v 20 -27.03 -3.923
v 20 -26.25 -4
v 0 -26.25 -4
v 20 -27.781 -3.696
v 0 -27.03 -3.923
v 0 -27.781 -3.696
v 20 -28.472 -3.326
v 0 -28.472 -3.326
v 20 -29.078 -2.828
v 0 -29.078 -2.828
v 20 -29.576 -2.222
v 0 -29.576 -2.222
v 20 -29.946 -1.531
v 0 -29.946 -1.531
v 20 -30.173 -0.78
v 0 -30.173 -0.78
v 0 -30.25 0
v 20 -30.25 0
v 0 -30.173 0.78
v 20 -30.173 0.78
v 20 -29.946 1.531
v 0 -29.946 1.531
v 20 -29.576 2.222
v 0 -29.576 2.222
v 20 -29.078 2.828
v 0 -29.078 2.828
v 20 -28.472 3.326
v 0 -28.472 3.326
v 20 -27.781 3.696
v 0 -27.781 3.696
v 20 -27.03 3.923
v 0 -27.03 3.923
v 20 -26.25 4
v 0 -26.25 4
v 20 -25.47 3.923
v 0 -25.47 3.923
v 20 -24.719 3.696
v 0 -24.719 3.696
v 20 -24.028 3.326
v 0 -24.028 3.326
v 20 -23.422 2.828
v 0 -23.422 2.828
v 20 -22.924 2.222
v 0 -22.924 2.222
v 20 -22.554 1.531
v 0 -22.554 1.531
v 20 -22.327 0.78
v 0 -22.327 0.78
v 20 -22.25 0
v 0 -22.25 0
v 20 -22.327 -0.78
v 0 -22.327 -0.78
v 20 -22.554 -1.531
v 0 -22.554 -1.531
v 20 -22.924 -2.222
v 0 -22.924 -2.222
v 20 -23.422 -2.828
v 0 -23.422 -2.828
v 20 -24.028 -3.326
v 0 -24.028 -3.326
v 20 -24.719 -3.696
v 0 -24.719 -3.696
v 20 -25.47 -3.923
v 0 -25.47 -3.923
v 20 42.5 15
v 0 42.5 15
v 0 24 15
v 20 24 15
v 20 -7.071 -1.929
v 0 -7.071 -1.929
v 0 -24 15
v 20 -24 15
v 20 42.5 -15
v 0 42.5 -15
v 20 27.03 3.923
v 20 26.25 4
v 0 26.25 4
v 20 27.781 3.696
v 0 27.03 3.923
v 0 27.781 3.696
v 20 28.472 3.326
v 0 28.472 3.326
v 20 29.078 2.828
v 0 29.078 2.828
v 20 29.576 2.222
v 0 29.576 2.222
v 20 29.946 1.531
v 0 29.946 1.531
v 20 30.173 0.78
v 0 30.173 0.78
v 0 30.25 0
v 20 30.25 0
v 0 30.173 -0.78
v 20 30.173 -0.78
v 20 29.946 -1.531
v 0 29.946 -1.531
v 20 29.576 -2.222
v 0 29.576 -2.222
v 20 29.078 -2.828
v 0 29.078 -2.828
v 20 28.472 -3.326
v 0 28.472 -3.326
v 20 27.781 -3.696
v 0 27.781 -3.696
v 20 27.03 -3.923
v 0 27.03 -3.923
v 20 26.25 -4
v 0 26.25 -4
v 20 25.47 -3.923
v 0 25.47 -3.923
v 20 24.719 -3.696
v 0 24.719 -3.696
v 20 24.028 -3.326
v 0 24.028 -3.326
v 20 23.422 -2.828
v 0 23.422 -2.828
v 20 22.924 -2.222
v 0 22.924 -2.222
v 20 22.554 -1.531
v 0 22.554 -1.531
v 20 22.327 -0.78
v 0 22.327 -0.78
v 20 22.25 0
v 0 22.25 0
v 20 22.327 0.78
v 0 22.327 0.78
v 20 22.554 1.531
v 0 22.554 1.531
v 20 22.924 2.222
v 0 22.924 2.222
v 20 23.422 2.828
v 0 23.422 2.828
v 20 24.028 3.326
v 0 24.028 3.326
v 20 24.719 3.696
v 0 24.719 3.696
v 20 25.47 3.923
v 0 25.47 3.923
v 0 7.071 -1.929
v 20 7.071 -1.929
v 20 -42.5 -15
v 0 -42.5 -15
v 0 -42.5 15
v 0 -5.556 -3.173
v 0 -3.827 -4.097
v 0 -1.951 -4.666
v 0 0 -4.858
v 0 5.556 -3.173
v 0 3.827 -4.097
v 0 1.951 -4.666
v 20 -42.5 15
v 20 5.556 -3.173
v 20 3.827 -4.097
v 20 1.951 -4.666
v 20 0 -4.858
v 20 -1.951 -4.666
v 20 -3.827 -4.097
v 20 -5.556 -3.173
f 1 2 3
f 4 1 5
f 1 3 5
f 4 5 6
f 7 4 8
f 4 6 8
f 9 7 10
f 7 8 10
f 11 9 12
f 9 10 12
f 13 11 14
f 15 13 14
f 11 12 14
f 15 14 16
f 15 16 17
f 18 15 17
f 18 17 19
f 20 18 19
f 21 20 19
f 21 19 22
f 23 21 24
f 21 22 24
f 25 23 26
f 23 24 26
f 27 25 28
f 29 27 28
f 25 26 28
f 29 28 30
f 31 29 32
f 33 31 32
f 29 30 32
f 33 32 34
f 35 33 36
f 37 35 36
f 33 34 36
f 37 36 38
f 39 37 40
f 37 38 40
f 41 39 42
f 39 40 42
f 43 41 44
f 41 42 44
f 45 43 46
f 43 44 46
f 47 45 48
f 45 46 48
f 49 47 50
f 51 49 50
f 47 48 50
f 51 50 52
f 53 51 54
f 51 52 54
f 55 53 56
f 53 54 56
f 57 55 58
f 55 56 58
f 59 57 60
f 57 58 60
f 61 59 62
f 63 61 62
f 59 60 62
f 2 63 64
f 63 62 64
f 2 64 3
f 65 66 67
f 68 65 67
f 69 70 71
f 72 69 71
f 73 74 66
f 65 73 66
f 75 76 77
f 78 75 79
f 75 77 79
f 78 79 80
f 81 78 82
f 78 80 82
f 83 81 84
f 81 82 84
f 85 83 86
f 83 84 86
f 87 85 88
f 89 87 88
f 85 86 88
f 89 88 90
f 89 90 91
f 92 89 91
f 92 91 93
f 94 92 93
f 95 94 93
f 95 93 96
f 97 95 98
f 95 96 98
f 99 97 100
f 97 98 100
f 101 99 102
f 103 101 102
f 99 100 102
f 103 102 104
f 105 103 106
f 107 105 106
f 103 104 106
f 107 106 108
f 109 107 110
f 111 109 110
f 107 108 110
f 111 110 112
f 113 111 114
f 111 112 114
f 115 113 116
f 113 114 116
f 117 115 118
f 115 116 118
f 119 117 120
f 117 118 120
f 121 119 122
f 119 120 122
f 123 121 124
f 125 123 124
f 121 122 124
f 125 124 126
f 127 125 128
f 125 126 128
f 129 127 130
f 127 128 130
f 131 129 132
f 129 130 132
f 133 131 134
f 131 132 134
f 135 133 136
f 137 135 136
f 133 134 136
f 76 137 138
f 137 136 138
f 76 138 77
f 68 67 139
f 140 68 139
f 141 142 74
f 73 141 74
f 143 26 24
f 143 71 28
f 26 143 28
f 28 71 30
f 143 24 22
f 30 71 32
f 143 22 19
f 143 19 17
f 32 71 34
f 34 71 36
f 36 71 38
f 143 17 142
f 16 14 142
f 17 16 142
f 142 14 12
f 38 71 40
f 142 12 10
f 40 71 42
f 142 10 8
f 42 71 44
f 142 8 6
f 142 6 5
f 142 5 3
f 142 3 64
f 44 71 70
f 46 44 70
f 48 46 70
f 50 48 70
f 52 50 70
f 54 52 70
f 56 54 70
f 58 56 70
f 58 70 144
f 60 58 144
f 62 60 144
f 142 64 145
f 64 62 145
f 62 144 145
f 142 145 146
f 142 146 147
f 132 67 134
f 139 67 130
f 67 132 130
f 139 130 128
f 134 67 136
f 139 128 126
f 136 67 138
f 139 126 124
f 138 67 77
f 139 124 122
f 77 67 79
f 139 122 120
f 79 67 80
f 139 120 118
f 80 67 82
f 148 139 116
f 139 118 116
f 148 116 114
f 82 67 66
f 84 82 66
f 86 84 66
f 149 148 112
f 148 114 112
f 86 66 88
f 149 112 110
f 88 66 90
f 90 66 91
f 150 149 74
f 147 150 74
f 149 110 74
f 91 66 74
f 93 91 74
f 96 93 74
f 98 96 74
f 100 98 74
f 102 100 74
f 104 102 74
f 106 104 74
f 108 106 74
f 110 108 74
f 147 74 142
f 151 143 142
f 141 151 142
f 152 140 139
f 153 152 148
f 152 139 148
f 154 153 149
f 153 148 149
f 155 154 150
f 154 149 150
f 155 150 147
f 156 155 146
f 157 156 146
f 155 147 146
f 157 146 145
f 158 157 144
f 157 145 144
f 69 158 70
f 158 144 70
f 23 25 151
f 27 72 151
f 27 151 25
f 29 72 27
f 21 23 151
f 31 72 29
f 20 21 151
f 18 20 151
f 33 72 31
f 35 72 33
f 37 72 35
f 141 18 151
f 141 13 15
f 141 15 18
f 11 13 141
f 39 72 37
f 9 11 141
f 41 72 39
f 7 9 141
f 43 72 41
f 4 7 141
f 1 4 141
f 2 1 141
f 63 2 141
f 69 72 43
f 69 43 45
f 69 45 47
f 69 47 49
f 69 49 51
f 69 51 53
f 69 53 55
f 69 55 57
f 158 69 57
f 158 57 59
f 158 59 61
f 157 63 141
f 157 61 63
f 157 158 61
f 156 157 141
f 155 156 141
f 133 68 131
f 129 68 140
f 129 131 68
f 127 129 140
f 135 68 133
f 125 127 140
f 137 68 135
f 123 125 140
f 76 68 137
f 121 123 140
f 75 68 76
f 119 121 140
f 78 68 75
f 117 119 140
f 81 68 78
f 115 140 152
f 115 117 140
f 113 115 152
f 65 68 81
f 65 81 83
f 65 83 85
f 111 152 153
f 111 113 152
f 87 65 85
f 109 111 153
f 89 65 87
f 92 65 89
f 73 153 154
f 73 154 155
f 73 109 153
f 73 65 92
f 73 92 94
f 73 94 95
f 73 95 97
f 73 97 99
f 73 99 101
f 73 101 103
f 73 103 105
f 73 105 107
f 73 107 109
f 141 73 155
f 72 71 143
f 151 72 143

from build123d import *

# Parameters (mm, degrees)
EXTRUDE_1_DEPTH     = 20
SKETCH_3_R          = 4
CUT_EXTRUDE_1_DEPTH = 20


with BuildPart() as part:
    # 草图1 → 凸台-拉伸1 (new body)
    with BuildSketch(Plane(origin=(0, 0, 0), x_dir=(0, 0, -1), z_dir=(1, 0, 0))):
        with BuildLine():
            Line((-15, 24), (1.928932188, 7.071067812))
            ThreePointArc((1.928932188, 7.071067812), (4.857864376, 0), (1.928932188, -7.071067812))
            Line((1.928932188, -7.071067812), (-15, -24))
            Line((-15, -24), (-15, -42.5))
            Line((-15, -42.5), (15, -42.5))
            Line((15, -42.5), (15, 42.5))
            Line((15, 42.5), (-15, 42.5))
            Line((-15, 42.5), (-15, 24))
        make_face()
    extrude(amount=EXTRUDE_1_DEPTH)

    # 草图3 → 切除-拉伸1 (cut)
    with BuildSketch(Plane.ZY):
        with Locations((0, 26.25)):
            Circle(SKETCH_3_R)
        with Locations(Location((0, -26.25, 0), (0, 0, 180))):
            Circle(SKETCH_3_R)
    extrude(amount=-CUT_EXTRUDE_1_DEPTH, mode=Mode.SUBTRACT)


solid = part.part
